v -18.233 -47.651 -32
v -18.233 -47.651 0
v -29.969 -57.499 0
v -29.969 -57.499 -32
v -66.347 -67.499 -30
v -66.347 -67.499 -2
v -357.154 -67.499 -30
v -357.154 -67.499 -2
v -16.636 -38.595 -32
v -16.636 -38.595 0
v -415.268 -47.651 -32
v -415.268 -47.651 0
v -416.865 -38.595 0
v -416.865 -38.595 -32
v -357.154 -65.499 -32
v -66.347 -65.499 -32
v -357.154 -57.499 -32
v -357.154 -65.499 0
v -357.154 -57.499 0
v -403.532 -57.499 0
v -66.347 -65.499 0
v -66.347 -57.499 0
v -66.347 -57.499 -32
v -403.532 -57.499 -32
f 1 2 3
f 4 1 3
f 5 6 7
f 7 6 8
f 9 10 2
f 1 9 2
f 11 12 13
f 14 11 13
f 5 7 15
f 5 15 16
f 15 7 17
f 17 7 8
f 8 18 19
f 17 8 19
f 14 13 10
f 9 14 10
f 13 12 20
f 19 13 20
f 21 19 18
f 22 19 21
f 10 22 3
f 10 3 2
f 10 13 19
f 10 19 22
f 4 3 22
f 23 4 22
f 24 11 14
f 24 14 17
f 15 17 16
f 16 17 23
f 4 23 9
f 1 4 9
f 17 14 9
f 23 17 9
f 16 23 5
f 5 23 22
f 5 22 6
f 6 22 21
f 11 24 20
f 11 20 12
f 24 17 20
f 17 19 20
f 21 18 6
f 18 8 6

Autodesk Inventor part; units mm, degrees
ref_plane "YZ Plane" through (0, 0, 0) normal (1, 0, 0) x (0, 1, 0)
ref_plane "XZ Plane" through (0, 0, 0) normal (0, 1, 0) x (-1, 0, 0)
ref_plane "XY Plane" through (0, 0, 0) normal (0, 0, 1) x (1, 0, 0)
sketch "Sketch1" plane through (0, 0, 0) normal (0, 0, 1) x (1, 0, 0)
  line L0 (-357.1541, -65.4988) -> (-437.5068, -65.4988) construction
  line L1 (-357.1541, -65.4988) -> (-357.1541, -57.4988) construction
  line L2 (-357.1541, -57.4988) -> (-403.5317, -57.4988) construction
  line L3 (-415.2682, -47.6507) -> (-403.5317, -57.4988) construction
  line L4 (-415.2682, -47.6507) -> (-435.2333, 65.5771) construction
  line L5 (-431.1016, 70.5012) -> (-435.2333, 65.5771) construction
  line L6 (-431.1016, 70.5012) -> (-418.2505, 70.5012) construction
  line L7 (-418.2505, 70.5012) -> (-418.2505, 78.5012) construction
  line L8 (-518.2505, 78.5012) -> (-418.2505, 78.5012) construction
  line L9 (-518.2505, 78.5012) -> (-518.2505, 75.5012) construction
  line L10 (-518.2505, 75.5012) -> (-467.3689, 75.5012) construction
  line L11 (-461.5006, 70.5771) -> (-467.3689, 75.5012) construction
  line L12 (-461.5006, 70.5771) -> (-437.5068, -65.4988) construction
  line L13 (4.0058, -65.4988) -> (-76.3469, -65.4988) construction
  line L14 (4.0058, -65.4988) -> (27.9996, 70.5771) construction
  line L15 (33.8679, 75.5012) -> (27.9996, 70.5771) construction
  line L16 (33.8679, 75.5012) -> (84.7495, 75.5012) construction
  line L17 (84.7495, 75.5012) -> (84.7495, 78.5012) construction
  line L18 (-15.2505, 78.5012) -> (84.7495, 78.5012) construction
  line L19 (-15.2505, 78.5012) -> (-15.2505, 70.5012) construction
  line L20 (-15.2505, 70.5012) -> (-2.3994, 70.5012) construction
  line L21 (1.7323, 65.5771) -> (-2.3994, 70.5012) construction
  line L22 (1.7323, 65.5771) -> (-18.2328, -47.6507) construction
  line L23 (-29.9693, -57.4988) -> (-18.2328, -47.6507) construction
  line L24 (-29.9693, -57.4988) -> (-76.3469, -57.4988) construction
  line L25 (-76.3469, -57.4988) -> (-76.3469, -65.4988) construction
  line L26 (-357.1541, -67.4988) -> (-357.1541, -65.4988) construction
  line L27 (-357.1541, -65.4988) -> (-437.5068, -65.4988) construction
  line L28 (-437.5068, -65.4988) -> (-437.1541, -67.4988) construction
  line L29 (-437.1541, -67.4988) -> (-357.1541, -67.4988) construction
  line L30 (3.6531, -67.4988) -> (4.0058, -65.4988) construction
  line L31 (4.0058, -65.4988) -> (-76.3469, -65.4988) construction
  line L32 (-76.3469, -65.4988) -> (-76.3469, -67.4988) construction
  line L33 (-76.3469, -67.4988) -> (3.6531, -67.4988) construction
  line L34 (-416.865, -38.5948) -> (-16.636, -38.5948)
  line L35 (-16.636, -38.5948) -> (-18.2328, -47.6507)
  line L36 (-18.2328, -47.6507) -> (-29.9693, -57.4988)
  line L37 (-29.9693, -57.4988) -> (-76.3469, -57.4988)
  line L38 (-76.3469, -57.4988) -> (-76.3469, -67.4988)
  line L39 (-76.3469, -67.4988) -> (-357.1541, -67.4988)
  line L40 (-357.1541, -67.4988) -> (-357.1541, -57.4988)
  line L41 (-357.1541, -57.4988) -> (-403.5317, -57.4988)
  line L42 (-403.5317, -57.4988) -> (-415.2682, -47.6507)
  line L43 (-415.2682, -47.6507) -> (-416.865, -38.5948)
extrude "Extrusion1" add sketch "Sketch1" against normal blind 32
sketch "Sketch2" plane through (0, 0, 0) normal (0, 0, 1) x (1, 0, 0)
  line L0 (3.6531, -67.4988) -> (4.0058, -65.4988) projected
  line L1 (4.0058, -65.4988) -> (-66.3469, -65.4988) projected
  line L2 (-66.3469, -65.4988) -> (-66.3469, -67.4988) projected
  line L3 (-66.3469, -67.4988) -> (3.6531, -67.4988) projected
  line L4 (4.0058, -65.4988) -> (-66.3469, -65.4988) projected
  line L5 (4.0058, -65.4988) -> (27.118, 65.5771) projected
  line L6 (-15.2505, 78.5012) -> (-15.2505, 72.5012) projected
  line L7 (1.7323, 65.5771) -> (-18.5801, -49.6204) projected
  line L8 (-66.3469, -59.4988) -> (-66.3469, -65.4988) projected
  line L9 (-367.1541, -65.4988) -> (-437.5068, -65.4988) projected
  line L10 (-367.1541, -65.4988) -> (-367.1541, -59.4988) projected
  line L11 (-414.9209, -49.6204) -> (-435.2333, 65.5771) projected
  line L12 (-418.2505, 72.5012) -> (-418.2505, 78.5012) projected
  line L13 (-460.619, 65.5771) -> (-437.5068, -65.4988) projected
  line L14 (-367.1541, -67.4988) -> (-367.1541, -65.4988) projected
  line L15 (-367.1541, -65.4988) -> (-437.5068, -65.4988) projected
  line L16 (-437.5068, -65.4988) -> (-437.1541, -67.4988) projected
  line L17 (-437.1541, -67.4988) -> (-367.1541, -67.4988) projected
  line L18 (-357.1541, -57.4988) -> (-66.3469, -57.4988)
  line L19 (-66.3469, -57.4988) -> (-66.3469, -67.4988)
  line L20 (-66.3469, -67.4988) -> (-357.1541, -67.4988)
  line L21 (-357.1541, -67.4988) -> (-357.1541, -57.4988)
  line L22 (1.7323, 65.5771) -> (-4.0776, 72.5012) projected
  line L23 (-429.4234, 72.5012) -> (-435.2333, 65.5771) projected
  line L24 (35.3697, 72.5012) -> (27.118, 65.5771) projected
  line L25 (84.7495, 72.5012) -> (84.7495, 78.5012) projected
  line L26 (-518.2505, 78.5012) -> (-518.2505, 72.5012) projected
  line L27 (-460.619, 65.5771) -> (-468.8707, 72.5012) projected
  line L28 (-15.2505, 78.5012) -> (84.7495, 78.5012) projected
  line L29 (-518.2505, 78.5012) -> (-418.2505, 78.5012) projected
  line L30 (-66.3469, -59.4988) -> (-30.3528, -59.4988) projected
  line L31 (84.7495, 72.5012) -> (35.3697, 72.5012) projected
  line L32 (-4.0776, 72.5012) -> (-15.2505, 72.5012) projected
  line L33 (-30.3528, -59.4988) -> (-18.5801, -49.6204) projected
  line L34 (-414.9209, -49.6204) -> (-403.1482, -59.4988) projected
  line L35 (-418.2505, 72.5012) -> (-429.4234, 72.5012) projected
  line L36 (-468.8707, 72.5012) -> (-518.2505, 72.5012) projected
  line L37 (-403.1482, -59.4988) -> (-367.1541, -59.4988) projected
  point P0 (0, 0)
extrude "Extrusion2" add sketch "Sketch2" against normal up to surface (32 mm away) contours L20 L21 L18 L19 L8 L2
chamfer "Chamfer1" distance 2 angle 45 2 edges at (-216.7505, -67.4988, -32) (-216.7505, -67.4988, 0)
properties part number "DNW_CON" material "Wood (Birch)"
